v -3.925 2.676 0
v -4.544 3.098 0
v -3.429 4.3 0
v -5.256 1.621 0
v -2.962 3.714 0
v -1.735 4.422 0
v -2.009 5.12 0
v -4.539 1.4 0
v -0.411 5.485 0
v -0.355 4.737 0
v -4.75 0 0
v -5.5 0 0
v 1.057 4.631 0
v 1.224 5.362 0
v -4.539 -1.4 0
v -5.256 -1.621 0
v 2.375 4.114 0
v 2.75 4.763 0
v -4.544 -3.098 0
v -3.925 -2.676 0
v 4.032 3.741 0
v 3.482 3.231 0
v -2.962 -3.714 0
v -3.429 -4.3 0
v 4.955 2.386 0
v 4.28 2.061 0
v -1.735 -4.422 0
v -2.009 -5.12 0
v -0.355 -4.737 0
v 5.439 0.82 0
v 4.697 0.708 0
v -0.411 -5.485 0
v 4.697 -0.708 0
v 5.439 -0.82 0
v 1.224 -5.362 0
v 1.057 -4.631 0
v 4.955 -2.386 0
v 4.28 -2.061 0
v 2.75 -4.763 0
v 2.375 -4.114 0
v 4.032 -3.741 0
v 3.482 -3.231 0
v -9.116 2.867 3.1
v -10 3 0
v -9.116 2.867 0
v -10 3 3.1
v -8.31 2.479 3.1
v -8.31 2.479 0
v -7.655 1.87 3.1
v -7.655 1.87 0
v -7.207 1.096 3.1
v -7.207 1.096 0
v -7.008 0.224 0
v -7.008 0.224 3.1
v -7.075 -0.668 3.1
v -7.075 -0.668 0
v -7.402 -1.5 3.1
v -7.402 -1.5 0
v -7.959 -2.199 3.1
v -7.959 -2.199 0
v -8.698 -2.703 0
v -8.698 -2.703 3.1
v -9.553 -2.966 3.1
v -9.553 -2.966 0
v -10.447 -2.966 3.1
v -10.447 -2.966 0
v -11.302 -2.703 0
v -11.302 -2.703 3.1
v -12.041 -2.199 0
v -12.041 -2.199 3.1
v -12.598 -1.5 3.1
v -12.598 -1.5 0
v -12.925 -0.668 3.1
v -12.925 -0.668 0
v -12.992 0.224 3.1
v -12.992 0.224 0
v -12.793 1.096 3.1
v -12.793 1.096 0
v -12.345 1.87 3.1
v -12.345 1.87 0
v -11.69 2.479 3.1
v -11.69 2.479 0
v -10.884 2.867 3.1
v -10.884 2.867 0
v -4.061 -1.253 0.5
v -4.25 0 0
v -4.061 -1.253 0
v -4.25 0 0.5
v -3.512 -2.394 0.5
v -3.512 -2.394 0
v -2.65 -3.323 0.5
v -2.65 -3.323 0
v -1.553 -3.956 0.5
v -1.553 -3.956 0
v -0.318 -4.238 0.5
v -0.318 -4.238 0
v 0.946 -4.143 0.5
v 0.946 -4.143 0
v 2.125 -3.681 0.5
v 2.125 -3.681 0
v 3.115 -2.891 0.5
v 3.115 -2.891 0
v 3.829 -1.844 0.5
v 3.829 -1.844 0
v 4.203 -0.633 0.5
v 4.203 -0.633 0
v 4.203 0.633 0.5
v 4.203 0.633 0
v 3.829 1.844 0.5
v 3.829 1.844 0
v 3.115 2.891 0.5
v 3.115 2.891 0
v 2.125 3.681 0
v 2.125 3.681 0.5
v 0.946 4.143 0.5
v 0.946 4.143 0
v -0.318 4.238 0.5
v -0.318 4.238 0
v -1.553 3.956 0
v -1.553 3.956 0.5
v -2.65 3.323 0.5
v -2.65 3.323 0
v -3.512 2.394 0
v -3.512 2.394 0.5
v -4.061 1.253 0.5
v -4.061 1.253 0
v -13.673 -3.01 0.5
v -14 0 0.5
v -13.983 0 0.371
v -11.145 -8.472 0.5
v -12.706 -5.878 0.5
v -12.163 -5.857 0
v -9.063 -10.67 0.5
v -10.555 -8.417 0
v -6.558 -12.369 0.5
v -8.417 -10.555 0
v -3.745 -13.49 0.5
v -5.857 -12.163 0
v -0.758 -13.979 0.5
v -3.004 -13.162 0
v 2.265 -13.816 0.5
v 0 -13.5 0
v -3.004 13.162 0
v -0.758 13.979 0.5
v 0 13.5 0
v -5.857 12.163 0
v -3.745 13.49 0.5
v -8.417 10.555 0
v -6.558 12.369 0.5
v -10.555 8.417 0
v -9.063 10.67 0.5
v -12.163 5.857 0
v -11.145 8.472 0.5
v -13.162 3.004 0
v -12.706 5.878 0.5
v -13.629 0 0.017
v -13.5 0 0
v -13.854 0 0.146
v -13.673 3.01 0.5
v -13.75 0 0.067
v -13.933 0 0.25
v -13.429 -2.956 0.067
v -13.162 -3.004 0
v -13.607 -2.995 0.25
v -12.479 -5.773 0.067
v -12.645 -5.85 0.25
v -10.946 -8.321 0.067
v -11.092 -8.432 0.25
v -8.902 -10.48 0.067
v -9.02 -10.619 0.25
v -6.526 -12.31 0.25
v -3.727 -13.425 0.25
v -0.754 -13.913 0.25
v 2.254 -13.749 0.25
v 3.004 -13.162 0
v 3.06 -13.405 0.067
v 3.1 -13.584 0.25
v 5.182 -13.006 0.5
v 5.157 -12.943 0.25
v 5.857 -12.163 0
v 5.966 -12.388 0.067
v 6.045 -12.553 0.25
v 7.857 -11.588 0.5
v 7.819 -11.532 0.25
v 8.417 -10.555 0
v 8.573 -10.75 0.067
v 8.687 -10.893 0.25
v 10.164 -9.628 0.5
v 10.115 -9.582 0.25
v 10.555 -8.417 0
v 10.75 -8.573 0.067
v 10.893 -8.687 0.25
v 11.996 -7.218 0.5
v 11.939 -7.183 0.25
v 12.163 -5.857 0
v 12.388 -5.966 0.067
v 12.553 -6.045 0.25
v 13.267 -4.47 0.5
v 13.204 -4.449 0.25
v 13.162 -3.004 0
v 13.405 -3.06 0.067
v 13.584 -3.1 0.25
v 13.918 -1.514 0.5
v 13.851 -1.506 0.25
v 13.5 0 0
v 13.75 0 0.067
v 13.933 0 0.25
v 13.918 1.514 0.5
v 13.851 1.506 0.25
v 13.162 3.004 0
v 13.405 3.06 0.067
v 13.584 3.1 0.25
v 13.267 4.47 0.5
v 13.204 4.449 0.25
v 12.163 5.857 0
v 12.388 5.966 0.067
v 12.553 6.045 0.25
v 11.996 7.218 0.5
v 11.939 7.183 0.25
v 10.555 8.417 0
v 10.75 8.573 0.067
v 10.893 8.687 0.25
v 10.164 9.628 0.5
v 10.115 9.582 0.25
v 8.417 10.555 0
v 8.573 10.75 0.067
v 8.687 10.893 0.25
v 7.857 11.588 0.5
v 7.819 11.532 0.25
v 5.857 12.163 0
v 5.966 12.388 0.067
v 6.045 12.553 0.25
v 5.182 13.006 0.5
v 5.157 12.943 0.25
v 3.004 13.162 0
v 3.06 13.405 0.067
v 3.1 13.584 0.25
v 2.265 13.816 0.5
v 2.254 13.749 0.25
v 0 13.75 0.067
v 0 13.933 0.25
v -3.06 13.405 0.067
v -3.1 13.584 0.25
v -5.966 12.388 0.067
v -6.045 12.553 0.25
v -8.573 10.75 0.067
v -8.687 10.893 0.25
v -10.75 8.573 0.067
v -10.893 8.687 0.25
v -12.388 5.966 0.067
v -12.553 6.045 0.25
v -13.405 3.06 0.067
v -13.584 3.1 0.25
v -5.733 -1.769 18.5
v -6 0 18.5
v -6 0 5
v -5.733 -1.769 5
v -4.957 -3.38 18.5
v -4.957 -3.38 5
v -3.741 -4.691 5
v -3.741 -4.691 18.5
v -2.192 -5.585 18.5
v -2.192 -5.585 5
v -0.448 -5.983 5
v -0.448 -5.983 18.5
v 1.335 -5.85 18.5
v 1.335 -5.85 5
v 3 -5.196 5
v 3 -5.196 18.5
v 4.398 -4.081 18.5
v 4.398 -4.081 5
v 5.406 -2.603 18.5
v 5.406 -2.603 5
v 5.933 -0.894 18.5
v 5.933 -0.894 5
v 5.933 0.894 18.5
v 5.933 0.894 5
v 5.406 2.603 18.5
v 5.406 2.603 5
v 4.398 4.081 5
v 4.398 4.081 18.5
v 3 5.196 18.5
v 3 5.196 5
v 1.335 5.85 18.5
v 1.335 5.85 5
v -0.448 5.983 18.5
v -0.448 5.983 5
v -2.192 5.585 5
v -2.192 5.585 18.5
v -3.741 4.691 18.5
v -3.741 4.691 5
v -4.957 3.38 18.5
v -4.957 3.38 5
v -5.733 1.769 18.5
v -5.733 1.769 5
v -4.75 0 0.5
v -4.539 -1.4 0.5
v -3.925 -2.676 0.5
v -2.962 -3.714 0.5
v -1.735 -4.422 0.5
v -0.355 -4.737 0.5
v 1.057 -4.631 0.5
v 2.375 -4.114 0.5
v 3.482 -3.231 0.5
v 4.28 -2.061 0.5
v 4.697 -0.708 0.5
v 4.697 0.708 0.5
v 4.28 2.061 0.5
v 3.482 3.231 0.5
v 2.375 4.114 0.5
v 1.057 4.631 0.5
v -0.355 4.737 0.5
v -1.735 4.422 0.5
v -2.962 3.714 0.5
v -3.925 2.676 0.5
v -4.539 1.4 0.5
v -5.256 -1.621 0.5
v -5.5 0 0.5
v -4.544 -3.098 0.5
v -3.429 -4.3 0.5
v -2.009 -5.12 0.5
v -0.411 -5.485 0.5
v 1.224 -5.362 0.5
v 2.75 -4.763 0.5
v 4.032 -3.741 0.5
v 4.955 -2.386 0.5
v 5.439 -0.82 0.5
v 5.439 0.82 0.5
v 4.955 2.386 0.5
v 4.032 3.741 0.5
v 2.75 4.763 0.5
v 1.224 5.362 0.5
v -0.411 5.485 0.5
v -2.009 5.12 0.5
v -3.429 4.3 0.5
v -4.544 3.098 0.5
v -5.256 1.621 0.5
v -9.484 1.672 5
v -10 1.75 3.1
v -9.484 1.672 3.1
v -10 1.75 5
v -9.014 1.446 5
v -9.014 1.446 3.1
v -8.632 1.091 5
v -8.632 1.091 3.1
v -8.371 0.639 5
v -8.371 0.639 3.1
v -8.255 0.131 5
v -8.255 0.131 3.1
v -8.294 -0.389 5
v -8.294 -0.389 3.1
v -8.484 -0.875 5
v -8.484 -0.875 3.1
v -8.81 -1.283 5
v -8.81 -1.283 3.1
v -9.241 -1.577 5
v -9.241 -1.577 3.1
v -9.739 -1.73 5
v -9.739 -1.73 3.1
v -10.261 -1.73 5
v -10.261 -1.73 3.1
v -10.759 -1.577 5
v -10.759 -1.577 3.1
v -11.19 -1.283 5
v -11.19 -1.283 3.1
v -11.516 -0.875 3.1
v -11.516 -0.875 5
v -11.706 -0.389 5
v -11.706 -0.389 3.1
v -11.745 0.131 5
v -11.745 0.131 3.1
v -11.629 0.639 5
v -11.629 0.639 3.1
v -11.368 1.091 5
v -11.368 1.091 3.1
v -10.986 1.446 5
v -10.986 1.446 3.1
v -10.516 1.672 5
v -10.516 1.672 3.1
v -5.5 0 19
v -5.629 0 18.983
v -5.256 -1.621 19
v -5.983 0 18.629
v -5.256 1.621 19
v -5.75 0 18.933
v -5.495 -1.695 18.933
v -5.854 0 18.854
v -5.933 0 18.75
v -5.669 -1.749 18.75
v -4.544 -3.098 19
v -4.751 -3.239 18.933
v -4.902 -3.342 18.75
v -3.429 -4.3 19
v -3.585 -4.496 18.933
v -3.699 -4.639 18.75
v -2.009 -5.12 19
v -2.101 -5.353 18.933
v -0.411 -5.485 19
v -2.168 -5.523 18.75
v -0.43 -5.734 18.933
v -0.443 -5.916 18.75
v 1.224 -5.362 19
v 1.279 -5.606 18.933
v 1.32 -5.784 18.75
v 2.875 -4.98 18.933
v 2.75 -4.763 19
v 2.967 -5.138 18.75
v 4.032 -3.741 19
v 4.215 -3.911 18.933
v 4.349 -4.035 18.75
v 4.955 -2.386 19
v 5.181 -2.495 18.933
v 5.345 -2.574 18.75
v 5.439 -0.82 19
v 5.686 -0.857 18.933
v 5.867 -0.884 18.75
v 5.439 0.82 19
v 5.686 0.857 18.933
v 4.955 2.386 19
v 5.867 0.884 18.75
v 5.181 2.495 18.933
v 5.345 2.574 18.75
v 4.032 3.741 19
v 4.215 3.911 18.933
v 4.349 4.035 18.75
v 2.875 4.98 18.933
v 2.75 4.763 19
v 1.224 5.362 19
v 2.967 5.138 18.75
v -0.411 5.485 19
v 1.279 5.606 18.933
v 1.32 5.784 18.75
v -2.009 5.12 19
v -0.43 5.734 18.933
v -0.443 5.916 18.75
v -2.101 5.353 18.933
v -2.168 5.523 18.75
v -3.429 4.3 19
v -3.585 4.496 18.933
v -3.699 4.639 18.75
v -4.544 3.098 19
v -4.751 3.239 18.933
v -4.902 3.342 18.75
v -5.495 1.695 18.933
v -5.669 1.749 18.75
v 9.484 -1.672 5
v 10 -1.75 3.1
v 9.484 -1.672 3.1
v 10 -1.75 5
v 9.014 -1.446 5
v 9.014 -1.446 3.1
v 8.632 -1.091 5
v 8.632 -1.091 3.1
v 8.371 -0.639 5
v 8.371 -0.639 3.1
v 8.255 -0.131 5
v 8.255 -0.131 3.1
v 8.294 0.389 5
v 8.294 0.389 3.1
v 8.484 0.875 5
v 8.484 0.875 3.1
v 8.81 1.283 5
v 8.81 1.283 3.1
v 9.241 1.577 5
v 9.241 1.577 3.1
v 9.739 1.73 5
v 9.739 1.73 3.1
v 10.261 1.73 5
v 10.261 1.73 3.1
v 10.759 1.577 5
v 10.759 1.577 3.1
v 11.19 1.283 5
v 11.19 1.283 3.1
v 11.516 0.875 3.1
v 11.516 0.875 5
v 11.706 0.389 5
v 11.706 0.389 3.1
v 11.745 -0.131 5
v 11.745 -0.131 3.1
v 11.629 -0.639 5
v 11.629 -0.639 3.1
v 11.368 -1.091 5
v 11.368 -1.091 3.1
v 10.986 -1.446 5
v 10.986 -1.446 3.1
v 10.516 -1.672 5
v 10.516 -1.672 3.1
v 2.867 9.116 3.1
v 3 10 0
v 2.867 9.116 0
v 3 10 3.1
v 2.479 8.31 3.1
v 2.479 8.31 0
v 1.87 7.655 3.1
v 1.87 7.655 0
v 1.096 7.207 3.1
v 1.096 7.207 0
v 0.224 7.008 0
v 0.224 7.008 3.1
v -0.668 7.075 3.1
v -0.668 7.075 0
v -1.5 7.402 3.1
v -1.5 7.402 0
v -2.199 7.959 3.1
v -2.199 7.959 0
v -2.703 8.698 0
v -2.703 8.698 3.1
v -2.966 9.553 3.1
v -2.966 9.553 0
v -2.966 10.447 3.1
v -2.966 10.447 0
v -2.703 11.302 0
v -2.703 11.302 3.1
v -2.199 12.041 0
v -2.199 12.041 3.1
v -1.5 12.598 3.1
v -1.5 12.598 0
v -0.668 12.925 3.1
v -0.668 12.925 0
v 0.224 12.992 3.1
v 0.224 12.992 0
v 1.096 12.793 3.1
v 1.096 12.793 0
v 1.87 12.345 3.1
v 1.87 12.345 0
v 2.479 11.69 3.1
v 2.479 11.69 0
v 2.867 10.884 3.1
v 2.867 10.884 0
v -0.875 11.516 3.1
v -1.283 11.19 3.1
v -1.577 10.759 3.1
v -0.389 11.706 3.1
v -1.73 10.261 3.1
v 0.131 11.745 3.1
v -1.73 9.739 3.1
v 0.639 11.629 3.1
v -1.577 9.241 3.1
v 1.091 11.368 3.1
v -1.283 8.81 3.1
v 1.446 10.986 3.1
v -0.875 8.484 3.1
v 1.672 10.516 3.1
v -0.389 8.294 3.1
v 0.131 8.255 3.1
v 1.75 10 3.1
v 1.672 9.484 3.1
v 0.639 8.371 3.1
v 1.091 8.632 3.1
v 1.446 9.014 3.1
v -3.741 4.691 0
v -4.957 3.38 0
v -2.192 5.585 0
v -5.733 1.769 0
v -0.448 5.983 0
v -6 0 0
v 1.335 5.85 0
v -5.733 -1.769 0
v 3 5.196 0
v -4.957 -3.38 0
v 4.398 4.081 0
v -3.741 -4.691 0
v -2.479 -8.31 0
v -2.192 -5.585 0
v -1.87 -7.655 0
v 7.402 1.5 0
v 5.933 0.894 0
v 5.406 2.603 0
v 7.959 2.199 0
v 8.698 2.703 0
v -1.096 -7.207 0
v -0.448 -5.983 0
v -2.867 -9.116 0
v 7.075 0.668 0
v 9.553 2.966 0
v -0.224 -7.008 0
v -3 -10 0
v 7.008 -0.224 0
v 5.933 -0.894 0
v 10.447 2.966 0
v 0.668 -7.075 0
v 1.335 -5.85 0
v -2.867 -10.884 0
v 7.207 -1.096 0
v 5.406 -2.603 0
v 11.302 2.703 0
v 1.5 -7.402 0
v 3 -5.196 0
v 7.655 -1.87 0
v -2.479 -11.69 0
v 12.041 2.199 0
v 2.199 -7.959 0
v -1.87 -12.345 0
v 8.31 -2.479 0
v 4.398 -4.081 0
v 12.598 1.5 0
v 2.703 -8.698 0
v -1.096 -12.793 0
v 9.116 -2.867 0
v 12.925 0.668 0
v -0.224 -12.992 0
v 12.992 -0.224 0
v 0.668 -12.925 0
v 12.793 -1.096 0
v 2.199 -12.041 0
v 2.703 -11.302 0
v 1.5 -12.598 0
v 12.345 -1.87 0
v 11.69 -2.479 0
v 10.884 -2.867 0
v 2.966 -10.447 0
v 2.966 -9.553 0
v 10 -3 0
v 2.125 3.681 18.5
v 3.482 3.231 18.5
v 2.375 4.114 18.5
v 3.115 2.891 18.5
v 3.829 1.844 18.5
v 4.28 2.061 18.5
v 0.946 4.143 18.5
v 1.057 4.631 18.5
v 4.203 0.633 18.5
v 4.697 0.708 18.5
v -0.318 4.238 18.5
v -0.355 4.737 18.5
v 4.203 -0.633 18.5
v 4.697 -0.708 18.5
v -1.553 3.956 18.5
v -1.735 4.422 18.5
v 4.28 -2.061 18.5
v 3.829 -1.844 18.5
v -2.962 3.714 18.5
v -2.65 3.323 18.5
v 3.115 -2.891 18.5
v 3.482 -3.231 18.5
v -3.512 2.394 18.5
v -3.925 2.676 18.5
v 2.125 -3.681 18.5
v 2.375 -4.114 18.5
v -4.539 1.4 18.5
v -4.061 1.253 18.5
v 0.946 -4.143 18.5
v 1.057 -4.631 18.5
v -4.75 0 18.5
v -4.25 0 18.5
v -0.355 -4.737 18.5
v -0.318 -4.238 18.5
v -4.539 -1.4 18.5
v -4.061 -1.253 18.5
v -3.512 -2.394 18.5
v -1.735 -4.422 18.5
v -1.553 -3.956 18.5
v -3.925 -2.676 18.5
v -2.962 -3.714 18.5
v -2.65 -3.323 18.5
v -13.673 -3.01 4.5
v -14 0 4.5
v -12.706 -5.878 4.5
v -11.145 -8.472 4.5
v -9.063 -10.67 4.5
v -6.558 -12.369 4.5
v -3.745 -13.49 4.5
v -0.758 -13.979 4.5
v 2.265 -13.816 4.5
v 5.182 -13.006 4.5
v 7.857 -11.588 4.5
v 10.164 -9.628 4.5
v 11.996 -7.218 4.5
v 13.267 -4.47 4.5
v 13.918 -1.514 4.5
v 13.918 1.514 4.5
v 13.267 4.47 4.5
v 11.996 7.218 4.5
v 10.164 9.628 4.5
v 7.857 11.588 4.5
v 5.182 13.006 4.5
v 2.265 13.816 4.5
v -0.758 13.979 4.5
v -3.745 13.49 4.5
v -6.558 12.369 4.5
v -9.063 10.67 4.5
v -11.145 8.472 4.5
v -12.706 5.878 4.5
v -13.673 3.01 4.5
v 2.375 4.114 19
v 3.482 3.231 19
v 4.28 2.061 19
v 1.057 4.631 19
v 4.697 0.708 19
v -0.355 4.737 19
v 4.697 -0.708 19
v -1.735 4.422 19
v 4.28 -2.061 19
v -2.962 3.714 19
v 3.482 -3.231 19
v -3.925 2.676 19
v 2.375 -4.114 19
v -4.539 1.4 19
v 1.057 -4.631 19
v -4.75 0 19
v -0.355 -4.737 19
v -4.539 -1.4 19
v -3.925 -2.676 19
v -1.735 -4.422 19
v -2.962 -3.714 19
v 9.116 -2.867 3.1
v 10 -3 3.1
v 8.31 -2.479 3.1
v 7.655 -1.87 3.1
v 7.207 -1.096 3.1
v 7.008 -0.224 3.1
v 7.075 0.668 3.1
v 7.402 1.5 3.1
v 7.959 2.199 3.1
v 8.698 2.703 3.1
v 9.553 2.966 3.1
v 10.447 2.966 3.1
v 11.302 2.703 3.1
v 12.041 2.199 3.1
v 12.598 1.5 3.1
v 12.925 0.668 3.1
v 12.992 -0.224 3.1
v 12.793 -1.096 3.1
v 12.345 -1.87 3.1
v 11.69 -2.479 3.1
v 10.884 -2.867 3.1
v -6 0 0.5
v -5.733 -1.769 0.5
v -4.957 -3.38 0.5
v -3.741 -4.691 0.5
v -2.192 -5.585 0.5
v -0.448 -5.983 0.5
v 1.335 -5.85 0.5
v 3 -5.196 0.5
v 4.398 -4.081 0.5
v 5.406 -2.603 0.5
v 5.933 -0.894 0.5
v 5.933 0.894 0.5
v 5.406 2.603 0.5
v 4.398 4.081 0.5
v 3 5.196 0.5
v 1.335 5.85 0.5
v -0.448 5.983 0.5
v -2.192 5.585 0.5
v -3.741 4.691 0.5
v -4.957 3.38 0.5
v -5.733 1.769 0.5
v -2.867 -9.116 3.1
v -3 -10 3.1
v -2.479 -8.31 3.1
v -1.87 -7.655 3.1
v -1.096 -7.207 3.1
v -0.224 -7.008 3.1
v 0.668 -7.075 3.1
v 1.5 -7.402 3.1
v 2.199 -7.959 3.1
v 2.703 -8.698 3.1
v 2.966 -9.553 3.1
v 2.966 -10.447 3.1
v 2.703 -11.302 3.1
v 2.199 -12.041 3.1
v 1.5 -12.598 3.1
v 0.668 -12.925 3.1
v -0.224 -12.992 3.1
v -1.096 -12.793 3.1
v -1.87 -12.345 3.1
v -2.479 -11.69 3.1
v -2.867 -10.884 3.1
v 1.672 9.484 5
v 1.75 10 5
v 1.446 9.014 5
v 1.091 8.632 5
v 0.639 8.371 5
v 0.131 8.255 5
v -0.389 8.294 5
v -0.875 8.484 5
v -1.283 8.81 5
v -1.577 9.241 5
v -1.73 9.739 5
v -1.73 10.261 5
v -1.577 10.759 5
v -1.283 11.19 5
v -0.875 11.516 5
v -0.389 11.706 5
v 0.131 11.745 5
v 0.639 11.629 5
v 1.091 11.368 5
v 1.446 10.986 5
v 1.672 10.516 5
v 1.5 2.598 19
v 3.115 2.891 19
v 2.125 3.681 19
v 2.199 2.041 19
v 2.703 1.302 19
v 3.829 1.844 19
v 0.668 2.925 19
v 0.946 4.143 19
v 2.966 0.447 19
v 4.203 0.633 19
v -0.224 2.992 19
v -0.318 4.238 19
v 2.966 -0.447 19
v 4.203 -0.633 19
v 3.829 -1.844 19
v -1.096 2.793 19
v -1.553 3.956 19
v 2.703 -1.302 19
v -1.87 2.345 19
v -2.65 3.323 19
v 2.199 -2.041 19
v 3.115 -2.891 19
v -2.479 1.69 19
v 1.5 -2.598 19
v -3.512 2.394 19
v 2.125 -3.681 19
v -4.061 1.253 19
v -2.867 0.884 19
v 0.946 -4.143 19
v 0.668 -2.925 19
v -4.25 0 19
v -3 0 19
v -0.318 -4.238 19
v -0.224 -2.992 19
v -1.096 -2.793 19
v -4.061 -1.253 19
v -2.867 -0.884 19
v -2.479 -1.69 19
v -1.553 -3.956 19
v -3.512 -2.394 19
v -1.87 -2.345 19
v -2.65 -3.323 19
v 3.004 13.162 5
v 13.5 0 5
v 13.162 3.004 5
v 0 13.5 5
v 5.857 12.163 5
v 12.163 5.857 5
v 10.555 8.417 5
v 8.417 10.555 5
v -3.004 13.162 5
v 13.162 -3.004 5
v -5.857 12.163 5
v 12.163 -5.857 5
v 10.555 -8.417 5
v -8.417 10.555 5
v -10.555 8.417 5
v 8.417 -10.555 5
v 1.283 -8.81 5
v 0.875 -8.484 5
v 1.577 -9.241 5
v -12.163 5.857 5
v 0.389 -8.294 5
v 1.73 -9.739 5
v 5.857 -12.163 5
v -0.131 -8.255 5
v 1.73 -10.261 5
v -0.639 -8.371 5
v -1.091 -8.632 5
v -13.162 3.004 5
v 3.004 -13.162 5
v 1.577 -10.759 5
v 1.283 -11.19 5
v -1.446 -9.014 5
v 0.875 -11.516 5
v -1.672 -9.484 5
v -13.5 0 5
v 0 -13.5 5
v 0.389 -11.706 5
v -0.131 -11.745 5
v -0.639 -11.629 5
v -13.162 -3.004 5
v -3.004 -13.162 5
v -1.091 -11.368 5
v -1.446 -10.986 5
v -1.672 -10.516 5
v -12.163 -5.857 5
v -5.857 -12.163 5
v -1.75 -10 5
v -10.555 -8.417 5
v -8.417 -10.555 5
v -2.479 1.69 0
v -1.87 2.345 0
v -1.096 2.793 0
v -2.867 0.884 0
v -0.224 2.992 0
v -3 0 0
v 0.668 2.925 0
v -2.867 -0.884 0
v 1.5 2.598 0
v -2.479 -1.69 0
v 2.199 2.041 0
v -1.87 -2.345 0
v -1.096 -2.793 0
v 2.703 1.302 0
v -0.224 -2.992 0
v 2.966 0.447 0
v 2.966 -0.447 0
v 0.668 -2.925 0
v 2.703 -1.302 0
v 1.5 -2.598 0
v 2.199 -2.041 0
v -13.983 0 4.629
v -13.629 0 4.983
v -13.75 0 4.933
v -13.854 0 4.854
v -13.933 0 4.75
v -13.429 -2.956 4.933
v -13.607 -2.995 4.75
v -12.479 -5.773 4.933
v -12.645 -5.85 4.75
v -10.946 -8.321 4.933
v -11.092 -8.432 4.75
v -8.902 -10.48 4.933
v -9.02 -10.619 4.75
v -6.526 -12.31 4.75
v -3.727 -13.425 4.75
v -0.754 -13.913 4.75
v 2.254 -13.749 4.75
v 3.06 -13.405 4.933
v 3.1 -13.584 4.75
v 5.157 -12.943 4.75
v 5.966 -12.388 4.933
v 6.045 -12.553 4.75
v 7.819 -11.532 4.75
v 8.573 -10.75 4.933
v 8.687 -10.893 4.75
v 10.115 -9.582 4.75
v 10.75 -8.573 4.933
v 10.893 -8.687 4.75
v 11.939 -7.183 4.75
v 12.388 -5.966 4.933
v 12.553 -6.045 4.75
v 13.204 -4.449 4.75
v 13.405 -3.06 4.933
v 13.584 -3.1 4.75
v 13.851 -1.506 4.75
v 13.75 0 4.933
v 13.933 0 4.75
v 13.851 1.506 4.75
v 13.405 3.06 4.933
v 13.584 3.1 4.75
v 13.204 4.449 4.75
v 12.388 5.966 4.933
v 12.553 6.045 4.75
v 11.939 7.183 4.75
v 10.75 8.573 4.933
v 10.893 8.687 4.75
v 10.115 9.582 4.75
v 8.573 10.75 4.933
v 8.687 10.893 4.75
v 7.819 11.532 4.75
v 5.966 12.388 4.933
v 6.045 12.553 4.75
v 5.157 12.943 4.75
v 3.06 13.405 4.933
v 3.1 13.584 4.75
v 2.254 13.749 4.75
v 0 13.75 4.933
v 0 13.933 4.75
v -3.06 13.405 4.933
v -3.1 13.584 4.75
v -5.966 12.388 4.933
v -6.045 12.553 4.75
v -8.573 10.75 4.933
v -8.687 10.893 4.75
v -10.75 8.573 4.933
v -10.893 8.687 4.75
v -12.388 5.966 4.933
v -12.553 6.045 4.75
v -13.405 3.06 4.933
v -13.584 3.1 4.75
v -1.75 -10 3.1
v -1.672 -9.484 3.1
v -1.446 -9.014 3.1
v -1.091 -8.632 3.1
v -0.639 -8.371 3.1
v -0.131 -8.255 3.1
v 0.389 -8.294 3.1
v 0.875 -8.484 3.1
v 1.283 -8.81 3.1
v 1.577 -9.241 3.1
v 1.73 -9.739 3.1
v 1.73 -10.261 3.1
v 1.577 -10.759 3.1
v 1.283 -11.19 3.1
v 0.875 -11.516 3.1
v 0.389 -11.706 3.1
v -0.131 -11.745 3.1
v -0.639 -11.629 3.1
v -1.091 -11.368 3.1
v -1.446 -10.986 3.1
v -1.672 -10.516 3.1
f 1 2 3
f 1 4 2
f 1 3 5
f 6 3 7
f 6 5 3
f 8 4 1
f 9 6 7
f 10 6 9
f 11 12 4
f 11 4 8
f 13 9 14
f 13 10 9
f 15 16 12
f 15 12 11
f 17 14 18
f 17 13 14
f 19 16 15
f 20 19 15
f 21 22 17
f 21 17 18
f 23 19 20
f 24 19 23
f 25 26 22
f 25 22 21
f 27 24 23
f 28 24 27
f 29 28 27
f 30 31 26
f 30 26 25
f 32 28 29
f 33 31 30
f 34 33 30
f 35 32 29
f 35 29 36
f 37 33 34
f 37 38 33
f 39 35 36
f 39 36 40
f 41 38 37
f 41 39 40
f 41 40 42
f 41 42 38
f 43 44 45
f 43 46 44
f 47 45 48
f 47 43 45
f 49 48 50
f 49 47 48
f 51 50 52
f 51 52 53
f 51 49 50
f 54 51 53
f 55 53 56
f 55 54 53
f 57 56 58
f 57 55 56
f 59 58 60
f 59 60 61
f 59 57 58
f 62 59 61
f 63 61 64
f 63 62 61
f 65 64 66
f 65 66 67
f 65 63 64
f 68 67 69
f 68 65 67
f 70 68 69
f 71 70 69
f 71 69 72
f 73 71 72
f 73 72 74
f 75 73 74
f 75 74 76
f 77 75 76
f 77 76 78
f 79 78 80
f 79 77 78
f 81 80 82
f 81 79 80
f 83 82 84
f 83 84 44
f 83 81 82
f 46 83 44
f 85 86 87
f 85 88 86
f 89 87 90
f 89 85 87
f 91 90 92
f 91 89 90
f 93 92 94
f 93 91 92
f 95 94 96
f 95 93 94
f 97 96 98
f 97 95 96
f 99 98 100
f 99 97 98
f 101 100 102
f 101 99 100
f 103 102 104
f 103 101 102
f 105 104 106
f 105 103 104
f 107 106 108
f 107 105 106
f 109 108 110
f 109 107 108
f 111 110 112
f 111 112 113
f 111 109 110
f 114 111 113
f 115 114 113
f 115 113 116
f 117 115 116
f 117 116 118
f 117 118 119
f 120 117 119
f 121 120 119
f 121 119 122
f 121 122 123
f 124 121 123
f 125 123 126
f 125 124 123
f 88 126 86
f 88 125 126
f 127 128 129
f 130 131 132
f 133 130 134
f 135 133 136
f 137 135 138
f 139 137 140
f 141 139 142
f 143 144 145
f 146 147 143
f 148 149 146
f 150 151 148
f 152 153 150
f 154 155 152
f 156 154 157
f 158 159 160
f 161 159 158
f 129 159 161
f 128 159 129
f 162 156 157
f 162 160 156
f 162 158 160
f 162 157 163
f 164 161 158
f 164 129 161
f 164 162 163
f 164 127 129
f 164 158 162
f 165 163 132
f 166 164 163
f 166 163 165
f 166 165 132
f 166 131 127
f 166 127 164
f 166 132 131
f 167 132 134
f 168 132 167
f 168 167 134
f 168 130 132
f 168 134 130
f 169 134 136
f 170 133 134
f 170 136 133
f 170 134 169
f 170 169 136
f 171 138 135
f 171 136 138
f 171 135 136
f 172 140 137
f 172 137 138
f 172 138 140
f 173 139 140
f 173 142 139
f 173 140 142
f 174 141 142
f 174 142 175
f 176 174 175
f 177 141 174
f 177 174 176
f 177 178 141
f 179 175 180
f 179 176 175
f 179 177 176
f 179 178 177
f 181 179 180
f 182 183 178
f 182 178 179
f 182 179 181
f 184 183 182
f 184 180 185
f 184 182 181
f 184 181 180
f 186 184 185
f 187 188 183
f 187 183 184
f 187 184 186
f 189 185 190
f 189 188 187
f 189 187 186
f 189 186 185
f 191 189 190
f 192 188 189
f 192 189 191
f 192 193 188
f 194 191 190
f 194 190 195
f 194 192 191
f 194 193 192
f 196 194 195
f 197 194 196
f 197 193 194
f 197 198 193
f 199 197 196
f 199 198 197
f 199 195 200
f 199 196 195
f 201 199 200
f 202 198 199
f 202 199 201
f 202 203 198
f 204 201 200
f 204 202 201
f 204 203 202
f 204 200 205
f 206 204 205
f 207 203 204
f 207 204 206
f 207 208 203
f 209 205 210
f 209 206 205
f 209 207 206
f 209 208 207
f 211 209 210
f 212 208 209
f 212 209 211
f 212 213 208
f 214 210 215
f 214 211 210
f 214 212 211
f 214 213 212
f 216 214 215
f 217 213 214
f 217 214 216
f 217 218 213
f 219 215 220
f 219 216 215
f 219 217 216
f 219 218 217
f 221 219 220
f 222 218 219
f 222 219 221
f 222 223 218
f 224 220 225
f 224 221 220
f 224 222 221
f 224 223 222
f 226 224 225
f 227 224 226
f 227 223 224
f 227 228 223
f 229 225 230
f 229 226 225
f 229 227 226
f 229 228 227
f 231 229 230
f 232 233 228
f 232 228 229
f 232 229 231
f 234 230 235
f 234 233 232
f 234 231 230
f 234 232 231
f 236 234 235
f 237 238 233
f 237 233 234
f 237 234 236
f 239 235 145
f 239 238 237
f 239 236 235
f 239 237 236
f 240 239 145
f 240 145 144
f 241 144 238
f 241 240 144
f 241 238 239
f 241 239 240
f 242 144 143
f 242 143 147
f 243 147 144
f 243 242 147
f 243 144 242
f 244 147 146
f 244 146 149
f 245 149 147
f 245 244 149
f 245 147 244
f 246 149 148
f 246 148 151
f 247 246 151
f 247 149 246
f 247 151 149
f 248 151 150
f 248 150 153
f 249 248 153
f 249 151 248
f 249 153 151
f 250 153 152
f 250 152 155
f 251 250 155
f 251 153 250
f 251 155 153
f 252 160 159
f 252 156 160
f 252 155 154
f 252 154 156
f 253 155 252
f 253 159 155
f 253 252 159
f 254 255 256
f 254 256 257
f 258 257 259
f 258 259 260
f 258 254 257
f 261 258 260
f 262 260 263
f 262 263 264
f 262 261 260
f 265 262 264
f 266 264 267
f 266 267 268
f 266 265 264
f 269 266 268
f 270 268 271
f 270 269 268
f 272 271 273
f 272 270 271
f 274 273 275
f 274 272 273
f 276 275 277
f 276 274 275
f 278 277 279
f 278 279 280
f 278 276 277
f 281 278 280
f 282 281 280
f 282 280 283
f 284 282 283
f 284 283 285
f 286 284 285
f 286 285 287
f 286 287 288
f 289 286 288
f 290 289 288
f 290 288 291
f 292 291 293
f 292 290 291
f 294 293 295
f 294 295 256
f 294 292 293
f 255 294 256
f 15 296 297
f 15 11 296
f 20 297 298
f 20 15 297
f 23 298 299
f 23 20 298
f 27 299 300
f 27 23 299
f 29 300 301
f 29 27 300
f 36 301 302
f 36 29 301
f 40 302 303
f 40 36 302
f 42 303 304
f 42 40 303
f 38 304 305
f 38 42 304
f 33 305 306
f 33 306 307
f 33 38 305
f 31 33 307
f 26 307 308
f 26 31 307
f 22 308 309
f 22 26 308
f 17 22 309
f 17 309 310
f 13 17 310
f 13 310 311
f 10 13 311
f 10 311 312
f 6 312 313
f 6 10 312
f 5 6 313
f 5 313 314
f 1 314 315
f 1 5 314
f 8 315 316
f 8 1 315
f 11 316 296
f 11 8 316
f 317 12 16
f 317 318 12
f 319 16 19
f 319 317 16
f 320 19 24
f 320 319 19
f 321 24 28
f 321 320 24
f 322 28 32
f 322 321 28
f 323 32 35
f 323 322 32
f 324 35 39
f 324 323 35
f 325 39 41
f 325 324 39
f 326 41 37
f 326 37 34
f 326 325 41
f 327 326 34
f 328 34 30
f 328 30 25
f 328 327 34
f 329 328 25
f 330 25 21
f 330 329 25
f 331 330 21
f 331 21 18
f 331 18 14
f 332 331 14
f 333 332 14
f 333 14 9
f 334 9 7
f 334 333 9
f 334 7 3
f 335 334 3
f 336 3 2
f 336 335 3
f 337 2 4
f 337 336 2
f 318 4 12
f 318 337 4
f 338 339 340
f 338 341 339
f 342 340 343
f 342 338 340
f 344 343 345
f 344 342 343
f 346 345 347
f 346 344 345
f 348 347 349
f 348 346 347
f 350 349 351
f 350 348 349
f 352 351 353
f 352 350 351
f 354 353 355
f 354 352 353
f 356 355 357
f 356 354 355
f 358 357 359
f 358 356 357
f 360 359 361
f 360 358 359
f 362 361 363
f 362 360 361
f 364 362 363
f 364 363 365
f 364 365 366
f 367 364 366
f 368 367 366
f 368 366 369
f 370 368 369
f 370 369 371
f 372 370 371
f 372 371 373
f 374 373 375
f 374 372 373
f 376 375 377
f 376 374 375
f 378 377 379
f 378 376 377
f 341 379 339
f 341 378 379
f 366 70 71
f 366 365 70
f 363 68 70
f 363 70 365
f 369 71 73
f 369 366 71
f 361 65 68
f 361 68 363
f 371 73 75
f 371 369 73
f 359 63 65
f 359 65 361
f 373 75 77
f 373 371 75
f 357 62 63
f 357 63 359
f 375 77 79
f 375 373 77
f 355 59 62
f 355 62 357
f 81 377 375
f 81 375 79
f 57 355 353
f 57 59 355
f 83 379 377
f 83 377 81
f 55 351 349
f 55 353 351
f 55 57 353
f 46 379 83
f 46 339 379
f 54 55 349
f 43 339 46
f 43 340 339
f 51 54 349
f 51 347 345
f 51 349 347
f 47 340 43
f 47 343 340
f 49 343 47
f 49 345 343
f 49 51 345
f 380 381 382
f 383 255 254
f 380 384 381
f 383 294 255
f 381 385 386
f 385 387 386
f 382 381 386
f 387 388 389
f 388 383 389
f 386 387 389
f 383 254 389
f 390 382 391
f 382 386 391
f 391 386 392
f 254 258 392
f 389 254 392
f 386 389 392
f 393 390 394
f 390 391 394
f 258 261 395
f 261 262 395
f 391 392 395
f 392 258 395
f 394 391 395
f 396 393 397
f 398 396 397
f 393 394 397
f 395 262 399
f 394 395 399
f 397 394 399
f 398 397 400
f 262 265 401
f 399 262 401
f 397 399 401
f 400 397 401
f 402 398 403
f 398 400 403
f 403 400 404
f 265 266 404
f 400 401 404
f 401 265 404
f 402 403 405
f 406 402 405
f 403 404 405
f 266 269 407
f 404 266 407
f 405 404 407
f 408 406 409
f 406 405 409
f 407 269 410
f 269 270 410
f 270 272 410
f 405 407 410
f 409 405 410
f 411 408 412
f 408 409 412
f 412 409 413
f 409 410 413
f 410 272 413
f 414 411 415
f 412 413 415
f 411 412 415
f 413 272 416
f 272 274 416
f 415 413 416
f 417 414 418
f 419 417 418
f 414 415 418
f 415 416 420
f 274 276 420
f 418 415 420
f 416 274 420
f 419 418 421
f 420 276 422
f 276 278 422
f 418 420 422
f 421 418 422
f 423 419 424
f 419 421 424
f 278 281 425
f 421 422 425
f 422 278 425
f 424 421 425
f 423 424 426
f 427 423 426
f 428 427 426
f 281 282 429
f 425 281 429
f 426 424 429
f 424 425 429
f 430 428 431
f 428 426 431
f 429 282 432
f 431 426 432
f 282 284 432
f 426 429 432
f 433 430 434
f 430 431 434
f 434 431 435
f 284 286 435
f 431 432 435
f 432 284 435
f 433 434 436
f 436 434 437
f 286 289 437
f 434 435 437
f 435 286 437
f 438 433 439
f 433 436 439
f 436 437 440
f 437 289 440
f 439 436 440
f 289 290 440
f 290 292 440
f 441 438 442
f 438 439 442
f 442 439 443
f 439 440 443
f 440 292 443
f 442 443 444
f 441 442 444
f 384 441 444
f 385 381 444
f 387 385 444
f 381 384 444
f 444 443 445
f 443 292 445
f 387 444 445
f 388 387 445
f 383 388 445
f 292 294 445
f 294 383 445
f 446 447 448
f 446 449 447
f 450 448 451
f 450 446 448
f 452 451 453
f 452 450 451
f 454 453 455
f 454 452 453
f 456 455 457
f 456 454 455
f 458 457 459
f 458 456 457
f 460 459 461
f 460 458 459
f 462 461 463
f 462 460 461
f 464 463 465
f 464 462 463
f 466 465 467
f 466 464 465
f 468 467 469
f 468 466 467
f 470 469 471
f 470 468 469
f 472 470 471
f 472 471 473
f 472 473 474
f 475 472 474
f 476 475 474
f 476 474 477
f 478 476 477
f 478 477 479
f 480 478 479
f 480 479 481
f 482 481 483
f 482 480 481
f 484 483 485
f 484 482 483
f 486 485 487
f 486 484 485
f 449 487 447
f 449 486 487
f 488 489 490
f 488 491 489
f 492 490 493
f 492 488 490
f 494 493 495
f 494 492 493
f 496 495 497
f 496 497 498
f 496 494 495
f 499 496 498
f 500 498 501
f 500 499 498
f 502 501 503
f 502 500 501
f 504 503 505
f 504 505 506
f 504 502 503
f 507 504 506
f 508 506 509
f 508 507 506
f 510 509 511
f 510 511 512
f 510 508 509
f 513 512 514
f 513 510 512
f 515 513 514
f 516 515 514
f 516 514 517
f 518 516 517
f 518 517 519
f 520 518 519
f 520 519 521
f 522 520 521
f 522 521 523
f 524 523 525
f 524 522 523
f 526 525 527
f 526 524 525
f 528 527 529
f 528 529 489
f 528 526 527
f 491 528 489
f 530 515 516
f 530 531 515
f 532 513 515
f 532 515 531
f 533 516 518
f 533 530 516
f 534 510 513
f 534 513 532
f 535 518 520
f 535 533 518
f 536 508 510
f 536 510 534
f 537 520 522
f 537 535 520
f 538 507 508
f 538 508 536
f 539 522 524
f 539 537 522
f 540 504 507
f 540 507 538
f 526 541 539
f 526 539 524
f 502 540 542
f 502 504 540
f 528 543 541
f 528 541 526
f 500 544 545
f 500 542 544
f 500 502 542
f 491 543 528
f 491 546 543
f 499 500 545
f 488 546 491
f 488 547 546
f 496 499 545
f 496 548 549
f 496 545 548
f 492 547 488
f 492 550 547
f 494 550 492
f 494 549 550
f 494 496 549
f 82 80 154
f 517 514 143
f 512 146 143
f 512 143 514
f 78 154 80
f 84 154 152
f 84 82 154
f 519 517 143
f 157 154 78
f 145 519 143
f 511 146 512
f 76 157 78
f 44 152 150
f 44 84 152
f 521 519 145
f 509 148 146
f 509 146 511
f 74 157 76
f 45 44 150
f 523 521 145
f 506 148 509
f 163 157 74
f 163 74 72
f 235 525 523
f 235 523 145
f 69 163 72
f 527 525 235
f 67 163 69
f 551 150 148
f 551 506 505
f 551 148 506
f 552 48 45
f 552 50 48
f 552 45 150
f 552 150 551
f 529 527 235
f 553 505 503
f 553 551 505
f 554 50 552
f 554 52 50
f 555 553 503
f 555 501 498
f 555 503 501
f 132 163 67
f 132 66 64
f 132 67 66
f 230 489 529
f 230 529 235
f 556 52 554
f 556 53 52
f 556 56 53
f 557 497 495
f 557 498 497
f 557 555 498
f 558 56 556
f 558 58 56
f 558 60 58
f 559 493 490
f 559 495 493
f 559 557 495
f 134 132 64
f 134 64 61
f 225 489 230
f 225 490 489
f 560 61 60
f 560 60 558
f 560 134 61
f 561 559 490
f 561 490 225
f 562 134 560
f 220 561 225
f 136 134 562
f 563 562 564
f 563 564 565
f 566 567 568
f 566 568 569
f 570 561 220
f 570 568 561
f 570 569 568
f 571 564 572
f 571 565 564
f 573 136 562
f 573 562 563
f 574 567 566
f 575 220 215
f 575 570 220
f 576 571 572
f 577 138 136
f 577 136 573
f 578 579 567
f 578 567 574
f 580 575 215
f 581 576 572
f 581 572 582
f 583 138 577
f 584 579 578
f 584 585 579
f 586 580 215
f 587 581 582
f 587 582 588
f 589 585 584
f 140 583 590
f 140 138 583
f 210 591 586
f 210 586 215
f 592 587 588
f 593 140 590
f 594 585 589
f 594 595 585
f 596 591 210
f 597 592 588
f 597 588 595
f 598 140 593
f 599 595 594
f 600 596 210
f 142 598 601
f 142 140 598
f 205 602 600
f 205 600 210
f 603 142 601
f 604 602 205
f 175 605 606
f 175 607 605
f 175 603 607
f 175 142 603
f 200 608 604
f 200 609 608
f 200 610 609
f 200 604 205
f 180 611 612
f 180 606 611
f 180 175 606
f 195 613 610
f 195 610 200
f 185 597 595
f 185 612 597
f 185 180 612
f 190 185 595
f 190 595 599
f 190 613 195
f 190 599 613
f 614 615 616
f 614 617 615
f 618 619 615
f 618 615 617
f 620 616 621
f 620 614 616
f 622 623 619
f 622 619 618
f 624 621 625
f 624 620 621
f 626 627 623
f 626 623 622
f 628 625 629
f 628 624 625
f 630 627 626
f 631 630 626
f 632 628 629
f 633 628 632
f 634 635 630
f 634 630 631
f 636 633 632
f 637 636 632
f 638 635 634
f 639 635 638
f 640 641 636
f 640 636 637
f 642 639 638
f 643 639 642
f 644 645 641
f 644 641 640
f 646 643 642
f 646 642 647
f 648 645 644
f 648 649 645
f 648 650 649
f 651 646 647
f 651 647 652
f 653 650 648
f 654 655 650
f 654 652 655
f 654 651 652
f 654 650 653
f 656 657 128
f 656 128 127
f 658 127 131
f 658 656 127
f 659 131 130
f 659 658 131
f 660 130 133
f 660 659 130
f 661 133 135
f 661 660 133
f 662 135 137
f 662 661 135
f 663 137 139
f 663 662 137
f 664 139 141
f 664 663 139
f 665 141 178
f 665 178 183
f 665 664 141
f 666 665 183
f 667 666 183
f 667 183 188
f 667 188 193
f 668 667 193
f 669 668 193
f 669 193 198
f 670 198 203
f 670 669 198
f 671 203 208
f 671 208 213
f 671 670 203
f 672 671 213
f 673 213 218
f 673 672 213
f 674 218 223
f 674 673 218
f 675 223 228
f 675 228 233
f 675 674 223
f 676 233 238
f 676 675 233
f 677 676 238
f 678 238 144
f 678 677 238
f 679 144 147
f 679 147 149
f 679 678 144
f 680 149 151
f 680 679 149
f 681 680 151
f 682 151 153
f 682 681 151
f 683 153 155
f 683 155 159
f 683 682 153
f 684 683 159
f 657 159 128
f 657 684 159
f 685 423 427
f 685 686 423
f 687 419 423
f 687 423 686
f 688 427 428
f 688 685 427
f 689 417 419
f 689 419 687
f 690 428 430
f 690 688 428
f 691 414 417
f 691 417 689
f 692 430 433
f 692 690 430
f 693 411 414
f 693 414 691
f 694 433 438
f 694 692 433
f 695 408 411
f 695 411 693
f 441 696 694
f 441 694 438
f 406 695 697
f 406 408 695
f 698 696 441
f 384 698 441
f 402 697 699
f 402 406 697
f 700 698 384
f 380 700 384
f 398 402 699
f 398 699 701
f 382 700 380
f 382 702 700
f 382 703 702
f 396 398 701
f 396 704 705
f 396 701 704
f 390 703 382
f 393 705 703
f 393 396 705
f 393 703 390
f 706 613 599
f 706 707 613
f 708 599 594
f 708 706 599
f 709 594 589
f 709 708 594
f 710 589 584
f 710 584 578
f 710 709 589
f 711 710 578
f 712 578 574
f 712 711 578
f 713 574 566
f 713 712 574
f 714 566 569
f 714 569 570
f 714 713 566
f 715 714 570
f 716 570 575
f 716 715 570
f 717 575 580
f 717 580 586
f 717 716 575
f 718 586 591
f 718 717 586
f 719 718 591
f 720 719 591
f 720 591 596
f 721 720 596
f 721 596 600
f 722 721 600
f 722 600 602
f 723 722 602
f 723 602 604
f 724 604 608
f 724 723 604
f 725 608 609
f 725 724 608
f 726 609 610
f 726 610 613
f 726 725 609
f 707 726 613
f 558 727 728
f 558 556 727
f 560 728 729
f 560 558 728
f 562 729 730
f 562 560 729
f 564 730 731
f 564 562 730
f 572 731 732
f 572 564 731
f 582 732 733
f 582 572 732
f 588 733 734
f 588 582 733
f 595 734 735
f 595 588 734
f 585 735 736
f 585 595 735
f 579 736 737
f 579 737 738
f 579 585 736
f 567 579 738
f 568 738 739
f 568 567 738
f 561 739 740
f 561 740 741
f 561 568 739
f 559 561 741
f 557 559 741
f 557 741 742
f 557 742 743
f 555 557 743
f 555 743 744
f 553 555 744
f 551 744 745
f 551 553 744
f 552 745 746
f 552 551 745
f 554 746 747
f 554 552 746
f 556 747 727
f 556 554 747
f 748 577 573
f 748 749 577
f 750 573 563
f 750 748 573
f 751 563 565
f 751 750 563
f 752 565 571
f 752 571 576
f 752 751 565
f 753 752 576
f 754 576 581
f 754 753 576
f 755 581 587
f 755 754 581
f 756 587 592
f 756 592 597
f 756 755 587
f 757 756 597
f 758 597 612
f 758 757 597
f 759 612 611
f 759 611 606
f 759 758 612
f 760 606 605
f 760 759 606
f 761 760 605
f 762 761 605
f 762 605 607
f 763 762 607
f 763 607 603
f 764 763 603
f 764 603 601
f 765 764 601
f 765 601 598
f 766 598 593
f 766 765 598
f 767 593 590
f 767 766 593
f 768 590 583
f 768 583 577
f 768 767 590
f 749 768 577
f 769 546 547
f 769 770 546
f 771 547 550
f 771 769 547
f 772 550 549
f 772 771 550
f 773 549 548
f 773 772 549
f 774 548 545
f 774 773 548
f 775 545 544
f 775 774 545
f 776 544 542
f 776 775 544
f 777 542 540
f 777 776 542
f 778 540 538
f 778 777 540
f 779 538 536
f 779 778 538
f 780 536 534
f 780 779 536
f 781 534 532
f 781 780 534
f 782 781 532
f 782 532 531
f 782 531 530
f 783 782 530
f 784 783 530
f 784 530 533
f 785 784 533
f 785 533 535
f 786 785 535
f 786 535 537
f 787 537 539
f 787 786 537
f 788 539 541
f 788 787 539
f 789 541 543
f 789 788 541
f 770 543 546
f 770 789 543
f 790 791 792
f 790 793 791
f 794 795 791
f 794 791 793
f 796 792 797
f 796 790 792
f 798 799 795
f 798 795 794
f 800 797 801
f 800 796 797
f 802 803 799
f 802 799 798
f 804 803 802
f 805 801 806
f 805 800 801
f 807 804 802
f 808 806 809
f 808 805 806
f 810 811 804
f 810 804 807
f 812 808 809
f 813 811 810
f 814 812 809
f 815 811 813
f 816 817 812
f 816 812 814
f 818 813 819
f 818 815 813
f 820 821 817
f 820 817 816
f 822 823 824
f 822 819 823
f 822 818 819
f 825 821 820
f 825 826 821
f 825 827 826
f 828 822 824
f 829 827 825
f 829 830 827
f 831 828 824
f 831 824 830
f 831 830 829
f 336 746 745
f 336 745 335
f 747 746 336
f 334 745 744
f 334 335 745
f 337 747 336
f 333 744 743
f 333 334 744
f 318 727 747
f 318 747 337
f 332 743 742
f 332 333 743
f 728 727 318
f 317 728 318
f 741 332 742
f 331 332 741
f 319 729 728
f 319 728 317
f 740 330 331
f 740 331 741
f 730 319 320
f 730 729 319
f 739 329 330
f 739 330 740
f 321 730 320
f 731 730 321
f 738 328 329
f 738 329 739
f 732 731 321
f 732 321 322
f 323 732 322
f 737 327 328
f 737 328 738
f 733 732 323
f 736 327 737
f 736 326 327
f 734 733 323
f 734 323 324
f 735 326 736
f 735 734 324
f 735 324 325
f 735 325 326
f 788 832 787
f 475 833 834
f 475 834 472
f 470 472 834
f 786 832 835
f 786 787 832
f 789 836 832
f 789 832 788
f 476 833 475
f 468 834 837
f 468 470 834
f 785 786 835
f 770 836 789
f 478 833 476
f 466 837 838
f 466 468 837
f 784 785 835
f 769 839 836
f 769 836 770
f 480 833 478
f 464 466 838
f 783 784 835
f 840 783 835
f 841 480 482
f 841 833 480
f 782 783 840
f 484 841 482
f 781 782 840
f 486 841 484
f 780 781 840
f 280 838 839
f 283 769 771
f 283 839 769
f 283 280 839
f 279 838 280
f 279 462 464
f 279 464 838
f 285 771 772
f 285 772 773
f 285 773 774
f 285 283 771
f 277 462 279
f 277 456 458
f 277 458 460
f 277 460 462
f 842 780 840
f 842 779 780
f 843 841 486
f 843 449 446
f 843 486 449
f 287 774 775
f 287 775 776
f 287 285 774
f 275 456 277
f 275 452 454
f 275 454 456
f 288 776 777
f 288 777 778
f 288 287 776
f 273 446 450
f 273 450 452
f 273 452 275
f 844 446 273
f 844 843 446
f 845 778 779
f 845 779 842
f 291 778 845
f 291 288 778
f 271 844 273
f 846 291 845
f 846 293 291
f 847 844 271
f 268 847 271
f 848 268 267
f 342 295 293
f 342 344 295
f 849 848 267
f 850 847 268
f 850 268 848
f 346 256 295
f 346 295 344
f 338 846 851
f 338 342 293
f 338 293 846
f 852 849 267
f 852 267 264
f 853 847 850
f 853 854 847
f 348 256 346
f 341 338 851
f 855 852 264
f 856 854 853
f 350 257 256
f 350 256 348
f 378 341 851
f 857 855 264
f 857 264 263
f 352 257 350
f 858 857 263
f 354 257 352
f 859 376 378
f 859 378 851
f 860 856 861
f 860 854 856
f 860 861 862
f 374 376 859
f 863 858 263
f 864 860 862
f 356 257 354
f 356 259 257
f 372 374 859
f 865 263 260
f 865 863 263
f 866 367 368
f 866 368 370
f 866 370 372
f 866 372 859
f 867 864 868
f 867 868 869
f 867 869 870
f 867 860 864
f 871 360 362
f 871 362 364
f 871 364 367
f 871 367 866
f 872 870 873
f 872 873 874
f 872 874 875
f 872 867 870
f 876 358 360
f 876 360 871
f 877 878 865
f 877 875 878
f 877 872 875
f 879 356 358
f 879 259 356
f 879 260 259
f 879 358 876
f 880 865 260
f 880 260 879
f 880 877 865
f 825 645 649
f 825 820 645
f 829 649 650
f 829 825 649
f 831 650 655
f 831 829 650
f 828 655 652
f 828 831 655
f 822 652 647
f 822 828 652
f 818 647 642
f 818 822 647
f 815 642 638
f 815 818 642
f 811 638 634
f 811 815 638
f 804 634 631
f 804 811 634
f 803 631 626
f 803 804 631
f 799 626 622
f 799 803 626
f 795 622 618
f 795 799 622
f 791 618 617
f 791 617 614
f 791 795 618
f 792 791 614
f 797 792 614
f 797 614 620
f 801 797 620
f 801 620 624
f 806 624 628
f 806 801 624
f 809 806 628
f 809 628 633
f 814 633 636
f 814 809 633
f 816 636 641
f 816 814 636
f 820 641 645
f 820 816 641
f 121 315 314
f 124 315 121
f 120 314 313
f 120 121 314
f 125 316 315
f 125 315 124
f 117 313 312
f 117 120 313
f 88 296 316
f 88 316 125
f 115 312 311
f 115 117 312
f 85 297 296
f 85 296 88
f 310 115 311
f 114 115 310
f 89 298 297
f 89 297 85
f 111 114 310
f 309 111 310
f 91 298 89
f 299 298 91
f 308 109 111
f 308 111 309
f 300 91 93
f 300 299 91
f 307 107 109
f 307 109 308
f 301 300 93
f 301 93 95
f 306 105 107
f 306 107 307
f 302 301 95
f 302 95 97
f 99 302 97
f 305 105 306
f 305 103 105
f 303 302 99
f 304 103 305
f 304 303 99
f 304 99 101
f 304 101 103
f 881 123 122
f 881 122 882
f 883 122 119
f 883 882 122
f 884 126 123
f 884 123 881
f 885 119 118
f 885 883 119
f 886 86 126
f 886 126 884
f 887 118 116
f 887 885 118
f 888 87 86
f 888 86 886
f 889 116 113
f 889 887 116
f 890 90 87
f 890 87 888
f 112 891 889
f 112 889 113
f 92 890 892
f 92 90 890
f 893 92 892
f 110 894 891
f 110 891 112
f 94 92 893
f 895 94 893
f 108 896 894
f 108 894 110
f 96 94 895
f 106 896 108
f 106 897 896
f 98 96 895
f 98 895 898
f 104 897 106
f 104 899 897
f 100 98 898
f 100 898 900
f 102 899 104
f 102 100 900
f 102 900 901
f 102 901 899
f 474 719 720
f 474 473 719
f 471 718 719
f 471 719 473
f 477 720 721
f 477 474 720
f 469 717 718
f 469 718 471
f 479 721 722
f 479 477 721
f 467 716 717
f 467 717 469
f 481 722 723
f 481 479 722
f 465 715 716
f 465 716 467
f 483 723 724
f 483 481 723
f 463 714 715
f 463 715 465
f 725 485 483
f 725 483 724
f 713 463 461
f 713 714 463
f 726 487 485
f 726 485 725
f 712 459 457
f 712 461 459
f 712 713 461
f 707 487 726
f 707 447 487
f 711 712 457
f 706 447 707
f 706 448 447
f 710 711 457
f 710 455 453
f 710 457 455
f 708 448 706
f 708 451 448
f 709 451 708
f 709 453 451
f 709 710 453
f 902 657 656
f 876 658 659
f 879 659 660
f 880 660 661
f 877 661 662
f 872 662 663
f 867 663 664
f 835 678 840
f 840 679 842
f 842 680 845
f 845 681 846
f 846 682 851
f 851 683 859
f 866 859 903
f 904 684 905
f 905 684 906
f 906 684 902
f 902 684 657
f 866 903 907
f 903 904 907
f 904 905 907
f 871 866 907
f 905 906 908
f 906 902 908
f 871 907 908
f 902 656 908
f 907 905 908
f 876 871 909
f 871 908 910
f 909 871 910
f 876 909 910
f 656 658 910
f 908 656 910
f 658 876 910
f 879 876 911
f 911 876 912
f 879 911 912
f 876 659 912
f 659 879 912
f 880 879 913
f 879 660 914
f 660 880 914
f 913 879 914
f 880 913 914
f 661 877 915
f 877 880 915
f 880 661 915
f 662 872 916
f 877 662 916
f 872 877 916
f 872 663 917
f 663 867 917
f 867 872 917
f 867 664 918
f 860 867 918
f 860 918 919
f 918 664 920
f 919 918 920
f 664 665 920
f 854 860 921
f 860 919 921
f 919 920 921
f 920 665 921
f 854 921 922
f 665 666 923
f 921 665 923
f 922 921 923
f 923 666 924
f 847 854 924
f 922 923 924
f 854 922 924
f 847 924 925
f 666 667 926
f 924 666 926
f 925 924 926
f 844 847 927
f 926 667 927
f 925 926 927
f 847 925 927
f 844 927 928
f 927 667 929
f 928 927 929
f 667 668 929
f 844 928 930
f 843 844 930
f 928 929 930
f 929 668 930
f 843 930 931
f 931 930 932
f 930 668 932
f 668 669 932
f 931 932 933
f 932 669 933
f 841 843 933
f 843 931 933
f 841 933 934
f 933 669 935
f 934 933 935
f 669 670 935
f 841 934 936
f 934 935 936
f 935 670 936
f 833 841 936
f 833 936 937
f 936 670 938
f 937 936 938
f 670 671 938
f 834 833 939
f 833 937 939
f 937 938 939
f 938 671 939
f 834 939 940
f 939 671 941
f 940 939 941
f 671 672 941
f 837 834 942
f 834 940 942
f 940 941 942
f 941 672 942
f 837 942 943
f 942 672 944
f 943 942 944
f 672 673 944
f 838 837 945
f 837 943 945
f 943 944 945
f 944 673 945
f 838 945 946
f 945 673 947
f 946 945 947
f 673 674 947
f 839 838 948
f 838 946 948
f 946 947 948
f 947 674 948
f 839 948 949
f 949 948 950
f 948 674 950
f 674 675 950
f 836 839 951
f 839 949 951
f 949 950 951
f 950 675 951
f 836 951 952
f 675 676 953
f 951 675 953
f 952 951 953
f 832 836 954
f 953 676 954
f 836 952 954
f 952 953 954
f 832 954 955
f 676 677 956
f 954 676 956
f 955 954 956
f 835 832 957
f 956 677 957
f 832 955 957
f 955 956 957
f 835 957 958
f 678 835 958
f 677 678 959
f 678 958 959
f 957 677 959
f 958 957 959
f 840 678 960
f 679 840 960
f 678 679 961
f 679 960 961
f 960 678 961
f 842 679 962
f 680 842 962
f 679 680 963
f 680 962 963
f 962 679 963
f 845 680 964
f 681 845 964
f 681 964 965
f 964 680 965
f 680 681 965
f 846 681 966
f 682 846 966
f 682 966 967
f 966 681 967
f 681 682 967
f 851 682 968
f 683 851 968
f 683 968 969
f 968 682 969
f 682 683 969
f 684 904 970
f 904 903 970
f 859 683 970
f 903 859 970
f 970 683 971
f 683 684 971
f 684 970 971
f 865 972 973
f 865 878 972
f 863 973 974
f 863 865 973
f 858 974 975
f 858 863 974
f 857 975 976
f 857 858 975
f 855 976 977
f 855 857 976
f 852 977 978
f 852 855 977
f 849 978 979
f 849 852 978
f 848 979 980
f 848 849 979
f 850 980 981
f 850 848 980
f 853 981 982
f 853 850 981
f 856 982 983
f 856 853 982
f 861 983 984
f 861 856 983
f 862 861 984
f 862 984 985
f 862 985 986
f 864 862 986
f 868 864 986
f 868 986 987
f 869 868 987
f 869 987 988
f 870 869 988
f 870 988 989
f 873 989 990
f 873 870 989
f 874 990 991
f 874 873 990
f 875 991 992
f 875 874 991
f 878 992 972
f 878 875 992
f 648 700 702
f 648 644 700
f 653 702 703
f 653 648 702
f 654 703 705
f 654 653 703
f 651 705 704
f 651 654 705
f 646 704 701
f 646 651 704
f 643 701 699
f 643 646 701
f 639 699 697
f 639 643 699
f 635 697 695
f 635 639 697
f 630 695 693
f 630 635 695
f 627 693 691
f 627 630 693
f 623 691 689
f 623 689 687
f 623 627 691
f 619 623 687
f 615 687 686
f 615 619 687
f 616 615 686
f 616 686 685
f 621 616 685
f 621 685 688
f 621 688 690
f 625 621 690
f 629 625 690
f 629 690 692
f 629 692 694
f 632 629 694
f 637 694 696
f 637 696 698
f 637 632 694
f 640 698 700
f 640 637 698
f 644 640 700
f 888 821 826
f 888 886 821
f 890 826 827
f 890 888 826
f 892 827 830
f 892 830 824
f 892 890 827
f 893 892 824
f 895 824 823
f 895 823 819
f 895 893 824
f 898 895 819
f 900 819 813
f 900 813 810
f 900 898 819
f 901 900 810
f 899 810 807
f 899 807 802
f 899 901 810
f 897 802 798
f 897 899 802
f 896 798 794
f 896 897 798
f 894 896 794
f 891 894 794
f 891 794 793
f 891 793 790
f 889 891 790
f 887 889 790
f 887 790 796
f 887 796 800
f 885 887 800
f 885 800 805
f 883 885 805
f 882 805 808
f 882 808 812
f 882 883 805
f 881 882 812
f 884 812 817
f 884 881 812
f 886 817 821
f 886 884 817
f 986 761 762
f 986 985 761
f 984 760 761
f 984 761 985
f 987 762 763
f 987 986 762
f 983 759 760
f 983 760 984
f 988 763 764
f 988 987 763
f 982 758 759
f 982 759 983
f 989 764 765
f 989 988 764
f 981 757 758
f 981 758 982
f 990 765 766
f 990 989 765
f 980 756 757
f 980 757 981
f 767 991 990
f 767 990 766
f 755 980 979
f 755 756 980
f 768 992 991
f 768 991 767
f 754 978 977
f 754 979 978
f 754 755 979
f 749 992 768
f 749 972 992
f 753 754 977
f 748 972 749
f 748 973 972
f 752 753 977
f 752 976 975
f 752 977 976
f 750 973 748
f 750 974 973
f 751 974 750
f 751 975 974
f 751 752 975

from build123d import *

# Parameters (mm, degrees)
PADR_OCIRCULAR1_COUNT = 4
FILETE1_R             = 0.5


with BuildPart() as part:
    # Esboço1 → Revolução1 (revolve)
    with BuildSketch(Plane(origin=(0, 0, 0), x_dir=(0, 0, -1), z_dir=(-1, 0, 0)), mode=Mode.PRIVATE) as revolu_o1_sk:
        Polygon((0, 3), (0, 4.25), (-0.5, 4.25), (-0.5, 4.75), (0, 4.75), (0, 5.5), (-0.5, 5.5), (-0.5, 6), (0, 6), (0, 14), (-5, 14), (-5, 6), (-19, 6), (-19, 4.75), (-18.5, 4.75), (-18.5, 4.25), (-19, 4.25), (-19, 3), align=None)
    revolve(revolu_o1_sk.sketch.rotate(Axis((0, 0, 0), (0, 0, 1)), 270), axis=Axis((0, 0, 0), (0, 0, 1)))  # turned: the seam where the file's is

    # Esboço5 → Corte-Revolução1 (revolve, cut)
    with BuildSketch(Plane(origin=(0, 0, 0), x_dir=(0, 0, -1), z_dir=(1, 0, 0)), mode=Mode.PRIVATE) as corte_revolu_o1_sk:
        Polygon((0, 13), (-3.1, 13), (-3.1, 11.75), (-5, 11.75), (-5, 10), (0, 10), align=None)
    corte_revolu_o1 = revolve(corte_revolu_o1_sk.sketch.rotate(Axis((0, 10, 0), (0, 0, -1)), 90), axis=Axis((0, 10, 0), (0, 0, -1)), mode=Mode.SUBTRACT)  # turned: the seam where the file's is

    # PadrãoCircular1: Corte-Revolução1 ×4 about axis
    padr_ocircular1_axis = Axis((0, 0, 0), (0, 0, 1))
    for i in range(1, PADR_OCIRCULAR1_COUNT):
        add(corte_revolu_o1.rotate(padr_ocircular1_axis, i * 360 / PADR_OCIRCULAR1_COUNT), mode=Mode.SUBTRACT)

    # Filete1
    filete1_edges = [part.edges().sort_by_distance(p)[0] for p in [
        (6, 0, 19),
        (14, 0, 5),
        (14, 0, 0),
    ]]
    fillet(filete1_edges, radius=FILETE1_R)


solid = part.part
